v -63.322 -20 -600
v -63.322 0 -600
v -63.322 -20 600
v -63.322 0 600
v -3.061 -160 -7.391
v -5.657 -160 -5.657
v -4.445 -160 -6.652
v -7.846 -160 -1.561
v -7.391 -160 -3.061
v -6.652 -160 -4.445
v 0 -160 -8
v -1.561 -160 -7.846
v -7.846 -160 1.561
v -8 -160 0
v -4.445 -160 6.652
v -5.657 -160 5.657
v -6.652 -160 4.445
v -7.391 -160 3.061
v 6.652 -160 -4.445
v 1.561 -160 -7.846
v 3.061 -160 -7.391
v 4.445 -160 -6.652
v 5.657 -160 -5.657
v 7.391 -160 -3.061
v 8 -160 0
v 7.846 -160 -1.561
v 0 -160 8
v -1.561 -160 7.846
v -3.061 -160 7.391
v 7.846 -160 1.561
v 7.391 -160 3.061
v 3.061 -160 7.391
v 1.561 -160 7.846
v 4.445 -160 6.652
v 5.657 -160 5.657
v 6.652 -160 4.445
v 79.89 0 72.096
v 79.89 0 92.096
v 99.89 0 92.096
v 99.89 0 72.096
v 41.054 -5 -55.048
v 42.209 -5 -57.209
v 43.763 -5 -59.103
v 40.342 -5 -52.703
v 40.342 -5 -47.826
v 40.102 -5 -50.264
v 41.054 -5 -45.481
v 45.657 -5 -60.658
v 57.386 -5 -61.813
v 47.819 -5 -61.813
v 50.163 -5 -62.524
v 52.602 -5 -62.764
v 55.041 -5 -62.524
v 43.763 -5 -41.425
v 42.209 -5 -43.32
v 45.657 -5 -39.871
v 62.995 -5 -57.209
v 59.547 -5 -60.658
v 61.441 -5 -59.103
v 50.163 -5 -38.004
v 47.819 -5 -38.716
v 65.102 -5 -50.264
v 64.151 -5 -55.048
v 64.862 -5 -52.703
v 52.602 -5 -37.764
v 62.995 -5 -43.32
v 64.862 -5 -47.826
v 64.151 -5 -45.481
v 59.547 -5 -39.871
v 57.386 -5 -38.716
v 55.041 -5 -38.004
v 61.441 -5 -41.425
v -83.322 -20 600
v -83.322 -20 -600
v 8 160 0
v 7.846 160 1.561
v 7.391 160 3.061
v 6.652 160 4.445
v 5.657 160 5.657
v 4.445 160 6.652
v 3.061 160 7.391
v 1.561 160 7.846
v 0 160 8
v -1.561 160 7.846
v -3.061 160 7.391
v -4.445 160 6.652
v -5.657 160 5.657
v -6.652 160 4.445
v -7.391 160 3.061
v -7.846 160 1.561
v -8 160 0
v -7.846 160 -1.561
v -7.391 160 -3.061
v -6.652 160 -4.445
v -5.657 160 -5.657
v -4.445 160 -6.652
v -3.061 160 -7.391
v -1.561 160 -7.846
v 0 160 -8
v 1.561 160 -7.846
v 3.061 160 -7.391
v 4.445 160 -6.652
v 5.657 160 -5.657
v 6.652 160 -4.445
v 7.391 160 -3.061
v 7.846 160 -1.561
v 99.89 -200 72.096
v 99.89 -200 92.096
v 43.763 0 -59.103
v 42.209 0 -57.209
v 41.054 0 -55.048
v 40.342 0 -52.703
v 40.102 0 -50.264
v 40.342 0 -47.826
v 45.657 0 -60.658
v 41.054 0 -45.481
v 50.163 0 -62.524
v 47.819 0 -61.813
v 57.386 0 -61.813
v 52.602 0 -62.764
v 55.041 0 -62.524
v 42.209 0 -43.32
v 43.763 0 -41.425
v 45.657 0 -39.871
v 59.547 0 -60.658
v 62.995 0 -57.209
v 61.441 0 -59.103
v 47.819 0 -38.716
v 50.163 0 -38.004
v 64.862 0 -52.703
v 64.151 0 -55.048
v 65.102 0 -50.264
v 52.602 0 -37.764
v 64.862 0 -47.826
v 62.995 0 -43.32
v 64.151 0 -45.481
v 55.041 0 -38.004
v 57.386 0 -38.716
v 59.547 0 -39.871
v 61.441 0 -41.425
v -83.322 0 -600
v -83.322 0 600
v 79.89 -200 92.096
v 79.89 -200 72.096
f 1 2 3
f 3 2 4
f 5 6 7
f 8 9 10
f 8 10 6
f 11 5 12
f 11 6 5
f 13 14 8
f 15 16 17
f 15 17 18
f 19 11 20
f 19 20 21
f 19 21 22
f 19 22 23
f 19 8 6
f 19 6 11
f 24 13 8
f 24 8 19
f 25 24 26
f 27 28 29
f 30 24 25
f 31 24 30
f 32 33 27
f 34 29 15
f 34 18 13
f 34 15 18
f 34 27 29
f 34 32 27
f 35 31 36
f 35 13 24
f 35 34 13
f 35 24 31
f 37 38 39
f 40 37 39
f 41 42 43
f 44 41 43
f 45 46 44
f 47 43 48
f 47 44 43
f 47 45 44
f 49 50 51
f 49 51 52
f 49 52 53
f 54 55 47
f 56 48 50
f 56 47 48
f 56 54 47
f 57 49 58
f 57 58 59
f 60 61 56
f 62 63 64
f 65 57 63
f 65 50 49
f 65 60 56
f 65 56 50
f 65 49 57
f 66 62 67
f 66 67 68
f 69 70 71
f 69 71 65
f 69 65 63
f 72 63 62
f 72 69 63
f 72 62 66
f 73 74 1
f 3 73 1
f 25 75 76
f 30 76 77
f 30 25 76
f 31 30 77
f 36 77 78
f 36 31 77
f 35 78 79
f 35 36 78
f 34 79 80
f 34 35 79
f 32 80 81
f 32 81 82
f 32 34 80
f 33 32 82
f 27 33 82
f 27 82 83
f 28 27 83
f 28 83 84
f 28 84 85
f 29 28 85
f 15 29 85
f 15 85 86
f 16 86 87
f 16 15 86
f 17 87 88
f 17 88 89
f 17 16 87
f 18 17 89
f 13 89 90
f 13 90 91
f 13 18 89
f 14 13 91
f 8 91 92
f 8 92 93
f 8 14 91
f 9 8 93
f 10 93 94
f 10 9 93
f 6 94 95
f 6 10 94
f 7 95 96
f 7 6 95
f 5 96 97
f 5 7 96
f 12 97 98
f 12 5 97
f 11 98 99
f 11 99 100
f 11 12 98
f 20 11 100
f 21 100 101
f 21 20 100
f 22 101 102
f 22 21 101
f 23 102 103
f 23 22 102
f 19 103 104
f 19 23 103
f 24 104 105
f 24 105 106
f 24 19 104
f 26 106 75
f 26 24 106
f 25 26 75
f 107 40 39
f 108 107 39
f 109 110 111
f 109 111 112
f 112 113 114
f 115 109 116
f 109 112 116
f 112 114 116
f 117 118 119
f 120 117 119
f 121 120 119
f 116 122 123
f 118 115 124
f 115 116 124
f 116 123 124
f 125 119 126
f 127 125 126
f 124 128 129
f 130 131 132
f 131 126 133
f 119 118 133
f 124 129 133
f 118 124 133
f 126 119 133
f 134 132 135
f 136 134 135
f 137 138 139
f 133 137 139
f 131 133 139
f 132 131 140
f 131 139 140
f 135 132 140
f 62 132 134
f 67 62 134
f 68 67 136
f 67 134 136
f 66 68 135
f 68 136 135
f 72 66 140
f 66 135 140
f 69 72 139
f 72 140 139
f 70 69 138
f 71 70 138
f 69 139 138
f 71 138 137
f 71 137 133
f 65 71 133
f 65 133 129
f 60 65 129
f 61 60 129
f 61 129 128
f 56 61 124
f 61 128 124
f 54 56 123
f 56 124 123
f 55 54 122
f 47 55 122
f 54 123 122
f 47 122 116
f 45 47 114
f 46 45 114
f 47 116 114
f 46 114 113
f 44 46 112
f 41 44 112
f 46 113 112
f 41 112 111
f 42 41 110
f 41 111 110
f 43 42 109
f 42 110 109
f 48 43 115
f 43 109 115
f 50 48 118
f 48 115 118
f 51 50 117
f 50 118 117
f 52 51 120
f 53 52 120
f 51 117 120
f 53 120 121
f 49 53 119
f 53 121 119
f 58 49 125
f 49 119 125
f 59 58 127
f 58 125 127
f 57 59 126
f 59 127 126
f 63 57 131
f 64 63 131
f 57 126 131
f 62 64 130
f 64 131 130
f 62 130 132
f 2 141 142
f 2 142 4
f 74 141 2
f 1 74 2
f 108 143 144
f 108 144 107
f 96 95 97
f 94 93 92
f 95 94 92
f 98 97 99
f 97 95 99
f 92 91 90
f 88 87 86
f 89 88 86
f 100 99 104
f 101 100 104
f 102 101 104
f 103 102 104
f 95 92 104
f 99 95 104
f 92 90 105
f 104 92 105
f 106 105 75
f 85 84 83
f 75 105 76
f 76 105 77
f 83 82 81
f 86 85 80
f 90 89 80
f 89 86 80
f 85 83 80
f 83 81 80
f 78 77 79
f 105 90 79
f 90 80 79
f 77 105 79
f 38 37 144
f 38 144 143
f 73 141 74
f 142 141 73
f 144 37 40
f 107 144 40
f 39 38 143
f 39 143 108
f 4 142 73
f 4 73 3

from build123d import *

# Parameters (mm, degrees)
F0_R     = 8
F1_DEPTH = 160
F2_W     = 20
F2_H     = 1200
F3_DEPTH = 20
F4_W     = 20
F4_H     = 20
F5_DEPTH = 200
F6_R     = 12.5
F7_DEPTH = 5


with BuildPart() as f1:
    # F0 (on Front) → F1 (new body, symmetric)
    with BuildSketch(Plane.XZ):
        Circle(F0_R)
    extrude(amount=F1_DEPTH, both=True)


with BuildPart() as f3:
    # F2 (on Front) → F3 (new body)
    with BuildSketch(Plane.XZ):
        with Locations((-73.321827, 0)):
            Rectangle(F2_W, F2_H)
    extrude(amount=F3_DEPTH)


with BuildPart() as f5:
    # F4 (on Front) → F5 (new body)
    with BuildSketch(Plane.XZ):
        with Locations((89.889774, 82.095655)):
            Rectangle(F4_W, F4_H)
    extrude(amount=F5_DEPTH)


with BuildPart() as f7:
    # F6 (on Front) → F7 (new body)
    with BuildSketch(Plane.XZ):
        with Locations((52.602101, -50.264247)):
            Circle(F6_R)
    extrude(amount=F7_DEPTH)


solid = Compound([f1.part, f3.part, f5.part, f7.part])
